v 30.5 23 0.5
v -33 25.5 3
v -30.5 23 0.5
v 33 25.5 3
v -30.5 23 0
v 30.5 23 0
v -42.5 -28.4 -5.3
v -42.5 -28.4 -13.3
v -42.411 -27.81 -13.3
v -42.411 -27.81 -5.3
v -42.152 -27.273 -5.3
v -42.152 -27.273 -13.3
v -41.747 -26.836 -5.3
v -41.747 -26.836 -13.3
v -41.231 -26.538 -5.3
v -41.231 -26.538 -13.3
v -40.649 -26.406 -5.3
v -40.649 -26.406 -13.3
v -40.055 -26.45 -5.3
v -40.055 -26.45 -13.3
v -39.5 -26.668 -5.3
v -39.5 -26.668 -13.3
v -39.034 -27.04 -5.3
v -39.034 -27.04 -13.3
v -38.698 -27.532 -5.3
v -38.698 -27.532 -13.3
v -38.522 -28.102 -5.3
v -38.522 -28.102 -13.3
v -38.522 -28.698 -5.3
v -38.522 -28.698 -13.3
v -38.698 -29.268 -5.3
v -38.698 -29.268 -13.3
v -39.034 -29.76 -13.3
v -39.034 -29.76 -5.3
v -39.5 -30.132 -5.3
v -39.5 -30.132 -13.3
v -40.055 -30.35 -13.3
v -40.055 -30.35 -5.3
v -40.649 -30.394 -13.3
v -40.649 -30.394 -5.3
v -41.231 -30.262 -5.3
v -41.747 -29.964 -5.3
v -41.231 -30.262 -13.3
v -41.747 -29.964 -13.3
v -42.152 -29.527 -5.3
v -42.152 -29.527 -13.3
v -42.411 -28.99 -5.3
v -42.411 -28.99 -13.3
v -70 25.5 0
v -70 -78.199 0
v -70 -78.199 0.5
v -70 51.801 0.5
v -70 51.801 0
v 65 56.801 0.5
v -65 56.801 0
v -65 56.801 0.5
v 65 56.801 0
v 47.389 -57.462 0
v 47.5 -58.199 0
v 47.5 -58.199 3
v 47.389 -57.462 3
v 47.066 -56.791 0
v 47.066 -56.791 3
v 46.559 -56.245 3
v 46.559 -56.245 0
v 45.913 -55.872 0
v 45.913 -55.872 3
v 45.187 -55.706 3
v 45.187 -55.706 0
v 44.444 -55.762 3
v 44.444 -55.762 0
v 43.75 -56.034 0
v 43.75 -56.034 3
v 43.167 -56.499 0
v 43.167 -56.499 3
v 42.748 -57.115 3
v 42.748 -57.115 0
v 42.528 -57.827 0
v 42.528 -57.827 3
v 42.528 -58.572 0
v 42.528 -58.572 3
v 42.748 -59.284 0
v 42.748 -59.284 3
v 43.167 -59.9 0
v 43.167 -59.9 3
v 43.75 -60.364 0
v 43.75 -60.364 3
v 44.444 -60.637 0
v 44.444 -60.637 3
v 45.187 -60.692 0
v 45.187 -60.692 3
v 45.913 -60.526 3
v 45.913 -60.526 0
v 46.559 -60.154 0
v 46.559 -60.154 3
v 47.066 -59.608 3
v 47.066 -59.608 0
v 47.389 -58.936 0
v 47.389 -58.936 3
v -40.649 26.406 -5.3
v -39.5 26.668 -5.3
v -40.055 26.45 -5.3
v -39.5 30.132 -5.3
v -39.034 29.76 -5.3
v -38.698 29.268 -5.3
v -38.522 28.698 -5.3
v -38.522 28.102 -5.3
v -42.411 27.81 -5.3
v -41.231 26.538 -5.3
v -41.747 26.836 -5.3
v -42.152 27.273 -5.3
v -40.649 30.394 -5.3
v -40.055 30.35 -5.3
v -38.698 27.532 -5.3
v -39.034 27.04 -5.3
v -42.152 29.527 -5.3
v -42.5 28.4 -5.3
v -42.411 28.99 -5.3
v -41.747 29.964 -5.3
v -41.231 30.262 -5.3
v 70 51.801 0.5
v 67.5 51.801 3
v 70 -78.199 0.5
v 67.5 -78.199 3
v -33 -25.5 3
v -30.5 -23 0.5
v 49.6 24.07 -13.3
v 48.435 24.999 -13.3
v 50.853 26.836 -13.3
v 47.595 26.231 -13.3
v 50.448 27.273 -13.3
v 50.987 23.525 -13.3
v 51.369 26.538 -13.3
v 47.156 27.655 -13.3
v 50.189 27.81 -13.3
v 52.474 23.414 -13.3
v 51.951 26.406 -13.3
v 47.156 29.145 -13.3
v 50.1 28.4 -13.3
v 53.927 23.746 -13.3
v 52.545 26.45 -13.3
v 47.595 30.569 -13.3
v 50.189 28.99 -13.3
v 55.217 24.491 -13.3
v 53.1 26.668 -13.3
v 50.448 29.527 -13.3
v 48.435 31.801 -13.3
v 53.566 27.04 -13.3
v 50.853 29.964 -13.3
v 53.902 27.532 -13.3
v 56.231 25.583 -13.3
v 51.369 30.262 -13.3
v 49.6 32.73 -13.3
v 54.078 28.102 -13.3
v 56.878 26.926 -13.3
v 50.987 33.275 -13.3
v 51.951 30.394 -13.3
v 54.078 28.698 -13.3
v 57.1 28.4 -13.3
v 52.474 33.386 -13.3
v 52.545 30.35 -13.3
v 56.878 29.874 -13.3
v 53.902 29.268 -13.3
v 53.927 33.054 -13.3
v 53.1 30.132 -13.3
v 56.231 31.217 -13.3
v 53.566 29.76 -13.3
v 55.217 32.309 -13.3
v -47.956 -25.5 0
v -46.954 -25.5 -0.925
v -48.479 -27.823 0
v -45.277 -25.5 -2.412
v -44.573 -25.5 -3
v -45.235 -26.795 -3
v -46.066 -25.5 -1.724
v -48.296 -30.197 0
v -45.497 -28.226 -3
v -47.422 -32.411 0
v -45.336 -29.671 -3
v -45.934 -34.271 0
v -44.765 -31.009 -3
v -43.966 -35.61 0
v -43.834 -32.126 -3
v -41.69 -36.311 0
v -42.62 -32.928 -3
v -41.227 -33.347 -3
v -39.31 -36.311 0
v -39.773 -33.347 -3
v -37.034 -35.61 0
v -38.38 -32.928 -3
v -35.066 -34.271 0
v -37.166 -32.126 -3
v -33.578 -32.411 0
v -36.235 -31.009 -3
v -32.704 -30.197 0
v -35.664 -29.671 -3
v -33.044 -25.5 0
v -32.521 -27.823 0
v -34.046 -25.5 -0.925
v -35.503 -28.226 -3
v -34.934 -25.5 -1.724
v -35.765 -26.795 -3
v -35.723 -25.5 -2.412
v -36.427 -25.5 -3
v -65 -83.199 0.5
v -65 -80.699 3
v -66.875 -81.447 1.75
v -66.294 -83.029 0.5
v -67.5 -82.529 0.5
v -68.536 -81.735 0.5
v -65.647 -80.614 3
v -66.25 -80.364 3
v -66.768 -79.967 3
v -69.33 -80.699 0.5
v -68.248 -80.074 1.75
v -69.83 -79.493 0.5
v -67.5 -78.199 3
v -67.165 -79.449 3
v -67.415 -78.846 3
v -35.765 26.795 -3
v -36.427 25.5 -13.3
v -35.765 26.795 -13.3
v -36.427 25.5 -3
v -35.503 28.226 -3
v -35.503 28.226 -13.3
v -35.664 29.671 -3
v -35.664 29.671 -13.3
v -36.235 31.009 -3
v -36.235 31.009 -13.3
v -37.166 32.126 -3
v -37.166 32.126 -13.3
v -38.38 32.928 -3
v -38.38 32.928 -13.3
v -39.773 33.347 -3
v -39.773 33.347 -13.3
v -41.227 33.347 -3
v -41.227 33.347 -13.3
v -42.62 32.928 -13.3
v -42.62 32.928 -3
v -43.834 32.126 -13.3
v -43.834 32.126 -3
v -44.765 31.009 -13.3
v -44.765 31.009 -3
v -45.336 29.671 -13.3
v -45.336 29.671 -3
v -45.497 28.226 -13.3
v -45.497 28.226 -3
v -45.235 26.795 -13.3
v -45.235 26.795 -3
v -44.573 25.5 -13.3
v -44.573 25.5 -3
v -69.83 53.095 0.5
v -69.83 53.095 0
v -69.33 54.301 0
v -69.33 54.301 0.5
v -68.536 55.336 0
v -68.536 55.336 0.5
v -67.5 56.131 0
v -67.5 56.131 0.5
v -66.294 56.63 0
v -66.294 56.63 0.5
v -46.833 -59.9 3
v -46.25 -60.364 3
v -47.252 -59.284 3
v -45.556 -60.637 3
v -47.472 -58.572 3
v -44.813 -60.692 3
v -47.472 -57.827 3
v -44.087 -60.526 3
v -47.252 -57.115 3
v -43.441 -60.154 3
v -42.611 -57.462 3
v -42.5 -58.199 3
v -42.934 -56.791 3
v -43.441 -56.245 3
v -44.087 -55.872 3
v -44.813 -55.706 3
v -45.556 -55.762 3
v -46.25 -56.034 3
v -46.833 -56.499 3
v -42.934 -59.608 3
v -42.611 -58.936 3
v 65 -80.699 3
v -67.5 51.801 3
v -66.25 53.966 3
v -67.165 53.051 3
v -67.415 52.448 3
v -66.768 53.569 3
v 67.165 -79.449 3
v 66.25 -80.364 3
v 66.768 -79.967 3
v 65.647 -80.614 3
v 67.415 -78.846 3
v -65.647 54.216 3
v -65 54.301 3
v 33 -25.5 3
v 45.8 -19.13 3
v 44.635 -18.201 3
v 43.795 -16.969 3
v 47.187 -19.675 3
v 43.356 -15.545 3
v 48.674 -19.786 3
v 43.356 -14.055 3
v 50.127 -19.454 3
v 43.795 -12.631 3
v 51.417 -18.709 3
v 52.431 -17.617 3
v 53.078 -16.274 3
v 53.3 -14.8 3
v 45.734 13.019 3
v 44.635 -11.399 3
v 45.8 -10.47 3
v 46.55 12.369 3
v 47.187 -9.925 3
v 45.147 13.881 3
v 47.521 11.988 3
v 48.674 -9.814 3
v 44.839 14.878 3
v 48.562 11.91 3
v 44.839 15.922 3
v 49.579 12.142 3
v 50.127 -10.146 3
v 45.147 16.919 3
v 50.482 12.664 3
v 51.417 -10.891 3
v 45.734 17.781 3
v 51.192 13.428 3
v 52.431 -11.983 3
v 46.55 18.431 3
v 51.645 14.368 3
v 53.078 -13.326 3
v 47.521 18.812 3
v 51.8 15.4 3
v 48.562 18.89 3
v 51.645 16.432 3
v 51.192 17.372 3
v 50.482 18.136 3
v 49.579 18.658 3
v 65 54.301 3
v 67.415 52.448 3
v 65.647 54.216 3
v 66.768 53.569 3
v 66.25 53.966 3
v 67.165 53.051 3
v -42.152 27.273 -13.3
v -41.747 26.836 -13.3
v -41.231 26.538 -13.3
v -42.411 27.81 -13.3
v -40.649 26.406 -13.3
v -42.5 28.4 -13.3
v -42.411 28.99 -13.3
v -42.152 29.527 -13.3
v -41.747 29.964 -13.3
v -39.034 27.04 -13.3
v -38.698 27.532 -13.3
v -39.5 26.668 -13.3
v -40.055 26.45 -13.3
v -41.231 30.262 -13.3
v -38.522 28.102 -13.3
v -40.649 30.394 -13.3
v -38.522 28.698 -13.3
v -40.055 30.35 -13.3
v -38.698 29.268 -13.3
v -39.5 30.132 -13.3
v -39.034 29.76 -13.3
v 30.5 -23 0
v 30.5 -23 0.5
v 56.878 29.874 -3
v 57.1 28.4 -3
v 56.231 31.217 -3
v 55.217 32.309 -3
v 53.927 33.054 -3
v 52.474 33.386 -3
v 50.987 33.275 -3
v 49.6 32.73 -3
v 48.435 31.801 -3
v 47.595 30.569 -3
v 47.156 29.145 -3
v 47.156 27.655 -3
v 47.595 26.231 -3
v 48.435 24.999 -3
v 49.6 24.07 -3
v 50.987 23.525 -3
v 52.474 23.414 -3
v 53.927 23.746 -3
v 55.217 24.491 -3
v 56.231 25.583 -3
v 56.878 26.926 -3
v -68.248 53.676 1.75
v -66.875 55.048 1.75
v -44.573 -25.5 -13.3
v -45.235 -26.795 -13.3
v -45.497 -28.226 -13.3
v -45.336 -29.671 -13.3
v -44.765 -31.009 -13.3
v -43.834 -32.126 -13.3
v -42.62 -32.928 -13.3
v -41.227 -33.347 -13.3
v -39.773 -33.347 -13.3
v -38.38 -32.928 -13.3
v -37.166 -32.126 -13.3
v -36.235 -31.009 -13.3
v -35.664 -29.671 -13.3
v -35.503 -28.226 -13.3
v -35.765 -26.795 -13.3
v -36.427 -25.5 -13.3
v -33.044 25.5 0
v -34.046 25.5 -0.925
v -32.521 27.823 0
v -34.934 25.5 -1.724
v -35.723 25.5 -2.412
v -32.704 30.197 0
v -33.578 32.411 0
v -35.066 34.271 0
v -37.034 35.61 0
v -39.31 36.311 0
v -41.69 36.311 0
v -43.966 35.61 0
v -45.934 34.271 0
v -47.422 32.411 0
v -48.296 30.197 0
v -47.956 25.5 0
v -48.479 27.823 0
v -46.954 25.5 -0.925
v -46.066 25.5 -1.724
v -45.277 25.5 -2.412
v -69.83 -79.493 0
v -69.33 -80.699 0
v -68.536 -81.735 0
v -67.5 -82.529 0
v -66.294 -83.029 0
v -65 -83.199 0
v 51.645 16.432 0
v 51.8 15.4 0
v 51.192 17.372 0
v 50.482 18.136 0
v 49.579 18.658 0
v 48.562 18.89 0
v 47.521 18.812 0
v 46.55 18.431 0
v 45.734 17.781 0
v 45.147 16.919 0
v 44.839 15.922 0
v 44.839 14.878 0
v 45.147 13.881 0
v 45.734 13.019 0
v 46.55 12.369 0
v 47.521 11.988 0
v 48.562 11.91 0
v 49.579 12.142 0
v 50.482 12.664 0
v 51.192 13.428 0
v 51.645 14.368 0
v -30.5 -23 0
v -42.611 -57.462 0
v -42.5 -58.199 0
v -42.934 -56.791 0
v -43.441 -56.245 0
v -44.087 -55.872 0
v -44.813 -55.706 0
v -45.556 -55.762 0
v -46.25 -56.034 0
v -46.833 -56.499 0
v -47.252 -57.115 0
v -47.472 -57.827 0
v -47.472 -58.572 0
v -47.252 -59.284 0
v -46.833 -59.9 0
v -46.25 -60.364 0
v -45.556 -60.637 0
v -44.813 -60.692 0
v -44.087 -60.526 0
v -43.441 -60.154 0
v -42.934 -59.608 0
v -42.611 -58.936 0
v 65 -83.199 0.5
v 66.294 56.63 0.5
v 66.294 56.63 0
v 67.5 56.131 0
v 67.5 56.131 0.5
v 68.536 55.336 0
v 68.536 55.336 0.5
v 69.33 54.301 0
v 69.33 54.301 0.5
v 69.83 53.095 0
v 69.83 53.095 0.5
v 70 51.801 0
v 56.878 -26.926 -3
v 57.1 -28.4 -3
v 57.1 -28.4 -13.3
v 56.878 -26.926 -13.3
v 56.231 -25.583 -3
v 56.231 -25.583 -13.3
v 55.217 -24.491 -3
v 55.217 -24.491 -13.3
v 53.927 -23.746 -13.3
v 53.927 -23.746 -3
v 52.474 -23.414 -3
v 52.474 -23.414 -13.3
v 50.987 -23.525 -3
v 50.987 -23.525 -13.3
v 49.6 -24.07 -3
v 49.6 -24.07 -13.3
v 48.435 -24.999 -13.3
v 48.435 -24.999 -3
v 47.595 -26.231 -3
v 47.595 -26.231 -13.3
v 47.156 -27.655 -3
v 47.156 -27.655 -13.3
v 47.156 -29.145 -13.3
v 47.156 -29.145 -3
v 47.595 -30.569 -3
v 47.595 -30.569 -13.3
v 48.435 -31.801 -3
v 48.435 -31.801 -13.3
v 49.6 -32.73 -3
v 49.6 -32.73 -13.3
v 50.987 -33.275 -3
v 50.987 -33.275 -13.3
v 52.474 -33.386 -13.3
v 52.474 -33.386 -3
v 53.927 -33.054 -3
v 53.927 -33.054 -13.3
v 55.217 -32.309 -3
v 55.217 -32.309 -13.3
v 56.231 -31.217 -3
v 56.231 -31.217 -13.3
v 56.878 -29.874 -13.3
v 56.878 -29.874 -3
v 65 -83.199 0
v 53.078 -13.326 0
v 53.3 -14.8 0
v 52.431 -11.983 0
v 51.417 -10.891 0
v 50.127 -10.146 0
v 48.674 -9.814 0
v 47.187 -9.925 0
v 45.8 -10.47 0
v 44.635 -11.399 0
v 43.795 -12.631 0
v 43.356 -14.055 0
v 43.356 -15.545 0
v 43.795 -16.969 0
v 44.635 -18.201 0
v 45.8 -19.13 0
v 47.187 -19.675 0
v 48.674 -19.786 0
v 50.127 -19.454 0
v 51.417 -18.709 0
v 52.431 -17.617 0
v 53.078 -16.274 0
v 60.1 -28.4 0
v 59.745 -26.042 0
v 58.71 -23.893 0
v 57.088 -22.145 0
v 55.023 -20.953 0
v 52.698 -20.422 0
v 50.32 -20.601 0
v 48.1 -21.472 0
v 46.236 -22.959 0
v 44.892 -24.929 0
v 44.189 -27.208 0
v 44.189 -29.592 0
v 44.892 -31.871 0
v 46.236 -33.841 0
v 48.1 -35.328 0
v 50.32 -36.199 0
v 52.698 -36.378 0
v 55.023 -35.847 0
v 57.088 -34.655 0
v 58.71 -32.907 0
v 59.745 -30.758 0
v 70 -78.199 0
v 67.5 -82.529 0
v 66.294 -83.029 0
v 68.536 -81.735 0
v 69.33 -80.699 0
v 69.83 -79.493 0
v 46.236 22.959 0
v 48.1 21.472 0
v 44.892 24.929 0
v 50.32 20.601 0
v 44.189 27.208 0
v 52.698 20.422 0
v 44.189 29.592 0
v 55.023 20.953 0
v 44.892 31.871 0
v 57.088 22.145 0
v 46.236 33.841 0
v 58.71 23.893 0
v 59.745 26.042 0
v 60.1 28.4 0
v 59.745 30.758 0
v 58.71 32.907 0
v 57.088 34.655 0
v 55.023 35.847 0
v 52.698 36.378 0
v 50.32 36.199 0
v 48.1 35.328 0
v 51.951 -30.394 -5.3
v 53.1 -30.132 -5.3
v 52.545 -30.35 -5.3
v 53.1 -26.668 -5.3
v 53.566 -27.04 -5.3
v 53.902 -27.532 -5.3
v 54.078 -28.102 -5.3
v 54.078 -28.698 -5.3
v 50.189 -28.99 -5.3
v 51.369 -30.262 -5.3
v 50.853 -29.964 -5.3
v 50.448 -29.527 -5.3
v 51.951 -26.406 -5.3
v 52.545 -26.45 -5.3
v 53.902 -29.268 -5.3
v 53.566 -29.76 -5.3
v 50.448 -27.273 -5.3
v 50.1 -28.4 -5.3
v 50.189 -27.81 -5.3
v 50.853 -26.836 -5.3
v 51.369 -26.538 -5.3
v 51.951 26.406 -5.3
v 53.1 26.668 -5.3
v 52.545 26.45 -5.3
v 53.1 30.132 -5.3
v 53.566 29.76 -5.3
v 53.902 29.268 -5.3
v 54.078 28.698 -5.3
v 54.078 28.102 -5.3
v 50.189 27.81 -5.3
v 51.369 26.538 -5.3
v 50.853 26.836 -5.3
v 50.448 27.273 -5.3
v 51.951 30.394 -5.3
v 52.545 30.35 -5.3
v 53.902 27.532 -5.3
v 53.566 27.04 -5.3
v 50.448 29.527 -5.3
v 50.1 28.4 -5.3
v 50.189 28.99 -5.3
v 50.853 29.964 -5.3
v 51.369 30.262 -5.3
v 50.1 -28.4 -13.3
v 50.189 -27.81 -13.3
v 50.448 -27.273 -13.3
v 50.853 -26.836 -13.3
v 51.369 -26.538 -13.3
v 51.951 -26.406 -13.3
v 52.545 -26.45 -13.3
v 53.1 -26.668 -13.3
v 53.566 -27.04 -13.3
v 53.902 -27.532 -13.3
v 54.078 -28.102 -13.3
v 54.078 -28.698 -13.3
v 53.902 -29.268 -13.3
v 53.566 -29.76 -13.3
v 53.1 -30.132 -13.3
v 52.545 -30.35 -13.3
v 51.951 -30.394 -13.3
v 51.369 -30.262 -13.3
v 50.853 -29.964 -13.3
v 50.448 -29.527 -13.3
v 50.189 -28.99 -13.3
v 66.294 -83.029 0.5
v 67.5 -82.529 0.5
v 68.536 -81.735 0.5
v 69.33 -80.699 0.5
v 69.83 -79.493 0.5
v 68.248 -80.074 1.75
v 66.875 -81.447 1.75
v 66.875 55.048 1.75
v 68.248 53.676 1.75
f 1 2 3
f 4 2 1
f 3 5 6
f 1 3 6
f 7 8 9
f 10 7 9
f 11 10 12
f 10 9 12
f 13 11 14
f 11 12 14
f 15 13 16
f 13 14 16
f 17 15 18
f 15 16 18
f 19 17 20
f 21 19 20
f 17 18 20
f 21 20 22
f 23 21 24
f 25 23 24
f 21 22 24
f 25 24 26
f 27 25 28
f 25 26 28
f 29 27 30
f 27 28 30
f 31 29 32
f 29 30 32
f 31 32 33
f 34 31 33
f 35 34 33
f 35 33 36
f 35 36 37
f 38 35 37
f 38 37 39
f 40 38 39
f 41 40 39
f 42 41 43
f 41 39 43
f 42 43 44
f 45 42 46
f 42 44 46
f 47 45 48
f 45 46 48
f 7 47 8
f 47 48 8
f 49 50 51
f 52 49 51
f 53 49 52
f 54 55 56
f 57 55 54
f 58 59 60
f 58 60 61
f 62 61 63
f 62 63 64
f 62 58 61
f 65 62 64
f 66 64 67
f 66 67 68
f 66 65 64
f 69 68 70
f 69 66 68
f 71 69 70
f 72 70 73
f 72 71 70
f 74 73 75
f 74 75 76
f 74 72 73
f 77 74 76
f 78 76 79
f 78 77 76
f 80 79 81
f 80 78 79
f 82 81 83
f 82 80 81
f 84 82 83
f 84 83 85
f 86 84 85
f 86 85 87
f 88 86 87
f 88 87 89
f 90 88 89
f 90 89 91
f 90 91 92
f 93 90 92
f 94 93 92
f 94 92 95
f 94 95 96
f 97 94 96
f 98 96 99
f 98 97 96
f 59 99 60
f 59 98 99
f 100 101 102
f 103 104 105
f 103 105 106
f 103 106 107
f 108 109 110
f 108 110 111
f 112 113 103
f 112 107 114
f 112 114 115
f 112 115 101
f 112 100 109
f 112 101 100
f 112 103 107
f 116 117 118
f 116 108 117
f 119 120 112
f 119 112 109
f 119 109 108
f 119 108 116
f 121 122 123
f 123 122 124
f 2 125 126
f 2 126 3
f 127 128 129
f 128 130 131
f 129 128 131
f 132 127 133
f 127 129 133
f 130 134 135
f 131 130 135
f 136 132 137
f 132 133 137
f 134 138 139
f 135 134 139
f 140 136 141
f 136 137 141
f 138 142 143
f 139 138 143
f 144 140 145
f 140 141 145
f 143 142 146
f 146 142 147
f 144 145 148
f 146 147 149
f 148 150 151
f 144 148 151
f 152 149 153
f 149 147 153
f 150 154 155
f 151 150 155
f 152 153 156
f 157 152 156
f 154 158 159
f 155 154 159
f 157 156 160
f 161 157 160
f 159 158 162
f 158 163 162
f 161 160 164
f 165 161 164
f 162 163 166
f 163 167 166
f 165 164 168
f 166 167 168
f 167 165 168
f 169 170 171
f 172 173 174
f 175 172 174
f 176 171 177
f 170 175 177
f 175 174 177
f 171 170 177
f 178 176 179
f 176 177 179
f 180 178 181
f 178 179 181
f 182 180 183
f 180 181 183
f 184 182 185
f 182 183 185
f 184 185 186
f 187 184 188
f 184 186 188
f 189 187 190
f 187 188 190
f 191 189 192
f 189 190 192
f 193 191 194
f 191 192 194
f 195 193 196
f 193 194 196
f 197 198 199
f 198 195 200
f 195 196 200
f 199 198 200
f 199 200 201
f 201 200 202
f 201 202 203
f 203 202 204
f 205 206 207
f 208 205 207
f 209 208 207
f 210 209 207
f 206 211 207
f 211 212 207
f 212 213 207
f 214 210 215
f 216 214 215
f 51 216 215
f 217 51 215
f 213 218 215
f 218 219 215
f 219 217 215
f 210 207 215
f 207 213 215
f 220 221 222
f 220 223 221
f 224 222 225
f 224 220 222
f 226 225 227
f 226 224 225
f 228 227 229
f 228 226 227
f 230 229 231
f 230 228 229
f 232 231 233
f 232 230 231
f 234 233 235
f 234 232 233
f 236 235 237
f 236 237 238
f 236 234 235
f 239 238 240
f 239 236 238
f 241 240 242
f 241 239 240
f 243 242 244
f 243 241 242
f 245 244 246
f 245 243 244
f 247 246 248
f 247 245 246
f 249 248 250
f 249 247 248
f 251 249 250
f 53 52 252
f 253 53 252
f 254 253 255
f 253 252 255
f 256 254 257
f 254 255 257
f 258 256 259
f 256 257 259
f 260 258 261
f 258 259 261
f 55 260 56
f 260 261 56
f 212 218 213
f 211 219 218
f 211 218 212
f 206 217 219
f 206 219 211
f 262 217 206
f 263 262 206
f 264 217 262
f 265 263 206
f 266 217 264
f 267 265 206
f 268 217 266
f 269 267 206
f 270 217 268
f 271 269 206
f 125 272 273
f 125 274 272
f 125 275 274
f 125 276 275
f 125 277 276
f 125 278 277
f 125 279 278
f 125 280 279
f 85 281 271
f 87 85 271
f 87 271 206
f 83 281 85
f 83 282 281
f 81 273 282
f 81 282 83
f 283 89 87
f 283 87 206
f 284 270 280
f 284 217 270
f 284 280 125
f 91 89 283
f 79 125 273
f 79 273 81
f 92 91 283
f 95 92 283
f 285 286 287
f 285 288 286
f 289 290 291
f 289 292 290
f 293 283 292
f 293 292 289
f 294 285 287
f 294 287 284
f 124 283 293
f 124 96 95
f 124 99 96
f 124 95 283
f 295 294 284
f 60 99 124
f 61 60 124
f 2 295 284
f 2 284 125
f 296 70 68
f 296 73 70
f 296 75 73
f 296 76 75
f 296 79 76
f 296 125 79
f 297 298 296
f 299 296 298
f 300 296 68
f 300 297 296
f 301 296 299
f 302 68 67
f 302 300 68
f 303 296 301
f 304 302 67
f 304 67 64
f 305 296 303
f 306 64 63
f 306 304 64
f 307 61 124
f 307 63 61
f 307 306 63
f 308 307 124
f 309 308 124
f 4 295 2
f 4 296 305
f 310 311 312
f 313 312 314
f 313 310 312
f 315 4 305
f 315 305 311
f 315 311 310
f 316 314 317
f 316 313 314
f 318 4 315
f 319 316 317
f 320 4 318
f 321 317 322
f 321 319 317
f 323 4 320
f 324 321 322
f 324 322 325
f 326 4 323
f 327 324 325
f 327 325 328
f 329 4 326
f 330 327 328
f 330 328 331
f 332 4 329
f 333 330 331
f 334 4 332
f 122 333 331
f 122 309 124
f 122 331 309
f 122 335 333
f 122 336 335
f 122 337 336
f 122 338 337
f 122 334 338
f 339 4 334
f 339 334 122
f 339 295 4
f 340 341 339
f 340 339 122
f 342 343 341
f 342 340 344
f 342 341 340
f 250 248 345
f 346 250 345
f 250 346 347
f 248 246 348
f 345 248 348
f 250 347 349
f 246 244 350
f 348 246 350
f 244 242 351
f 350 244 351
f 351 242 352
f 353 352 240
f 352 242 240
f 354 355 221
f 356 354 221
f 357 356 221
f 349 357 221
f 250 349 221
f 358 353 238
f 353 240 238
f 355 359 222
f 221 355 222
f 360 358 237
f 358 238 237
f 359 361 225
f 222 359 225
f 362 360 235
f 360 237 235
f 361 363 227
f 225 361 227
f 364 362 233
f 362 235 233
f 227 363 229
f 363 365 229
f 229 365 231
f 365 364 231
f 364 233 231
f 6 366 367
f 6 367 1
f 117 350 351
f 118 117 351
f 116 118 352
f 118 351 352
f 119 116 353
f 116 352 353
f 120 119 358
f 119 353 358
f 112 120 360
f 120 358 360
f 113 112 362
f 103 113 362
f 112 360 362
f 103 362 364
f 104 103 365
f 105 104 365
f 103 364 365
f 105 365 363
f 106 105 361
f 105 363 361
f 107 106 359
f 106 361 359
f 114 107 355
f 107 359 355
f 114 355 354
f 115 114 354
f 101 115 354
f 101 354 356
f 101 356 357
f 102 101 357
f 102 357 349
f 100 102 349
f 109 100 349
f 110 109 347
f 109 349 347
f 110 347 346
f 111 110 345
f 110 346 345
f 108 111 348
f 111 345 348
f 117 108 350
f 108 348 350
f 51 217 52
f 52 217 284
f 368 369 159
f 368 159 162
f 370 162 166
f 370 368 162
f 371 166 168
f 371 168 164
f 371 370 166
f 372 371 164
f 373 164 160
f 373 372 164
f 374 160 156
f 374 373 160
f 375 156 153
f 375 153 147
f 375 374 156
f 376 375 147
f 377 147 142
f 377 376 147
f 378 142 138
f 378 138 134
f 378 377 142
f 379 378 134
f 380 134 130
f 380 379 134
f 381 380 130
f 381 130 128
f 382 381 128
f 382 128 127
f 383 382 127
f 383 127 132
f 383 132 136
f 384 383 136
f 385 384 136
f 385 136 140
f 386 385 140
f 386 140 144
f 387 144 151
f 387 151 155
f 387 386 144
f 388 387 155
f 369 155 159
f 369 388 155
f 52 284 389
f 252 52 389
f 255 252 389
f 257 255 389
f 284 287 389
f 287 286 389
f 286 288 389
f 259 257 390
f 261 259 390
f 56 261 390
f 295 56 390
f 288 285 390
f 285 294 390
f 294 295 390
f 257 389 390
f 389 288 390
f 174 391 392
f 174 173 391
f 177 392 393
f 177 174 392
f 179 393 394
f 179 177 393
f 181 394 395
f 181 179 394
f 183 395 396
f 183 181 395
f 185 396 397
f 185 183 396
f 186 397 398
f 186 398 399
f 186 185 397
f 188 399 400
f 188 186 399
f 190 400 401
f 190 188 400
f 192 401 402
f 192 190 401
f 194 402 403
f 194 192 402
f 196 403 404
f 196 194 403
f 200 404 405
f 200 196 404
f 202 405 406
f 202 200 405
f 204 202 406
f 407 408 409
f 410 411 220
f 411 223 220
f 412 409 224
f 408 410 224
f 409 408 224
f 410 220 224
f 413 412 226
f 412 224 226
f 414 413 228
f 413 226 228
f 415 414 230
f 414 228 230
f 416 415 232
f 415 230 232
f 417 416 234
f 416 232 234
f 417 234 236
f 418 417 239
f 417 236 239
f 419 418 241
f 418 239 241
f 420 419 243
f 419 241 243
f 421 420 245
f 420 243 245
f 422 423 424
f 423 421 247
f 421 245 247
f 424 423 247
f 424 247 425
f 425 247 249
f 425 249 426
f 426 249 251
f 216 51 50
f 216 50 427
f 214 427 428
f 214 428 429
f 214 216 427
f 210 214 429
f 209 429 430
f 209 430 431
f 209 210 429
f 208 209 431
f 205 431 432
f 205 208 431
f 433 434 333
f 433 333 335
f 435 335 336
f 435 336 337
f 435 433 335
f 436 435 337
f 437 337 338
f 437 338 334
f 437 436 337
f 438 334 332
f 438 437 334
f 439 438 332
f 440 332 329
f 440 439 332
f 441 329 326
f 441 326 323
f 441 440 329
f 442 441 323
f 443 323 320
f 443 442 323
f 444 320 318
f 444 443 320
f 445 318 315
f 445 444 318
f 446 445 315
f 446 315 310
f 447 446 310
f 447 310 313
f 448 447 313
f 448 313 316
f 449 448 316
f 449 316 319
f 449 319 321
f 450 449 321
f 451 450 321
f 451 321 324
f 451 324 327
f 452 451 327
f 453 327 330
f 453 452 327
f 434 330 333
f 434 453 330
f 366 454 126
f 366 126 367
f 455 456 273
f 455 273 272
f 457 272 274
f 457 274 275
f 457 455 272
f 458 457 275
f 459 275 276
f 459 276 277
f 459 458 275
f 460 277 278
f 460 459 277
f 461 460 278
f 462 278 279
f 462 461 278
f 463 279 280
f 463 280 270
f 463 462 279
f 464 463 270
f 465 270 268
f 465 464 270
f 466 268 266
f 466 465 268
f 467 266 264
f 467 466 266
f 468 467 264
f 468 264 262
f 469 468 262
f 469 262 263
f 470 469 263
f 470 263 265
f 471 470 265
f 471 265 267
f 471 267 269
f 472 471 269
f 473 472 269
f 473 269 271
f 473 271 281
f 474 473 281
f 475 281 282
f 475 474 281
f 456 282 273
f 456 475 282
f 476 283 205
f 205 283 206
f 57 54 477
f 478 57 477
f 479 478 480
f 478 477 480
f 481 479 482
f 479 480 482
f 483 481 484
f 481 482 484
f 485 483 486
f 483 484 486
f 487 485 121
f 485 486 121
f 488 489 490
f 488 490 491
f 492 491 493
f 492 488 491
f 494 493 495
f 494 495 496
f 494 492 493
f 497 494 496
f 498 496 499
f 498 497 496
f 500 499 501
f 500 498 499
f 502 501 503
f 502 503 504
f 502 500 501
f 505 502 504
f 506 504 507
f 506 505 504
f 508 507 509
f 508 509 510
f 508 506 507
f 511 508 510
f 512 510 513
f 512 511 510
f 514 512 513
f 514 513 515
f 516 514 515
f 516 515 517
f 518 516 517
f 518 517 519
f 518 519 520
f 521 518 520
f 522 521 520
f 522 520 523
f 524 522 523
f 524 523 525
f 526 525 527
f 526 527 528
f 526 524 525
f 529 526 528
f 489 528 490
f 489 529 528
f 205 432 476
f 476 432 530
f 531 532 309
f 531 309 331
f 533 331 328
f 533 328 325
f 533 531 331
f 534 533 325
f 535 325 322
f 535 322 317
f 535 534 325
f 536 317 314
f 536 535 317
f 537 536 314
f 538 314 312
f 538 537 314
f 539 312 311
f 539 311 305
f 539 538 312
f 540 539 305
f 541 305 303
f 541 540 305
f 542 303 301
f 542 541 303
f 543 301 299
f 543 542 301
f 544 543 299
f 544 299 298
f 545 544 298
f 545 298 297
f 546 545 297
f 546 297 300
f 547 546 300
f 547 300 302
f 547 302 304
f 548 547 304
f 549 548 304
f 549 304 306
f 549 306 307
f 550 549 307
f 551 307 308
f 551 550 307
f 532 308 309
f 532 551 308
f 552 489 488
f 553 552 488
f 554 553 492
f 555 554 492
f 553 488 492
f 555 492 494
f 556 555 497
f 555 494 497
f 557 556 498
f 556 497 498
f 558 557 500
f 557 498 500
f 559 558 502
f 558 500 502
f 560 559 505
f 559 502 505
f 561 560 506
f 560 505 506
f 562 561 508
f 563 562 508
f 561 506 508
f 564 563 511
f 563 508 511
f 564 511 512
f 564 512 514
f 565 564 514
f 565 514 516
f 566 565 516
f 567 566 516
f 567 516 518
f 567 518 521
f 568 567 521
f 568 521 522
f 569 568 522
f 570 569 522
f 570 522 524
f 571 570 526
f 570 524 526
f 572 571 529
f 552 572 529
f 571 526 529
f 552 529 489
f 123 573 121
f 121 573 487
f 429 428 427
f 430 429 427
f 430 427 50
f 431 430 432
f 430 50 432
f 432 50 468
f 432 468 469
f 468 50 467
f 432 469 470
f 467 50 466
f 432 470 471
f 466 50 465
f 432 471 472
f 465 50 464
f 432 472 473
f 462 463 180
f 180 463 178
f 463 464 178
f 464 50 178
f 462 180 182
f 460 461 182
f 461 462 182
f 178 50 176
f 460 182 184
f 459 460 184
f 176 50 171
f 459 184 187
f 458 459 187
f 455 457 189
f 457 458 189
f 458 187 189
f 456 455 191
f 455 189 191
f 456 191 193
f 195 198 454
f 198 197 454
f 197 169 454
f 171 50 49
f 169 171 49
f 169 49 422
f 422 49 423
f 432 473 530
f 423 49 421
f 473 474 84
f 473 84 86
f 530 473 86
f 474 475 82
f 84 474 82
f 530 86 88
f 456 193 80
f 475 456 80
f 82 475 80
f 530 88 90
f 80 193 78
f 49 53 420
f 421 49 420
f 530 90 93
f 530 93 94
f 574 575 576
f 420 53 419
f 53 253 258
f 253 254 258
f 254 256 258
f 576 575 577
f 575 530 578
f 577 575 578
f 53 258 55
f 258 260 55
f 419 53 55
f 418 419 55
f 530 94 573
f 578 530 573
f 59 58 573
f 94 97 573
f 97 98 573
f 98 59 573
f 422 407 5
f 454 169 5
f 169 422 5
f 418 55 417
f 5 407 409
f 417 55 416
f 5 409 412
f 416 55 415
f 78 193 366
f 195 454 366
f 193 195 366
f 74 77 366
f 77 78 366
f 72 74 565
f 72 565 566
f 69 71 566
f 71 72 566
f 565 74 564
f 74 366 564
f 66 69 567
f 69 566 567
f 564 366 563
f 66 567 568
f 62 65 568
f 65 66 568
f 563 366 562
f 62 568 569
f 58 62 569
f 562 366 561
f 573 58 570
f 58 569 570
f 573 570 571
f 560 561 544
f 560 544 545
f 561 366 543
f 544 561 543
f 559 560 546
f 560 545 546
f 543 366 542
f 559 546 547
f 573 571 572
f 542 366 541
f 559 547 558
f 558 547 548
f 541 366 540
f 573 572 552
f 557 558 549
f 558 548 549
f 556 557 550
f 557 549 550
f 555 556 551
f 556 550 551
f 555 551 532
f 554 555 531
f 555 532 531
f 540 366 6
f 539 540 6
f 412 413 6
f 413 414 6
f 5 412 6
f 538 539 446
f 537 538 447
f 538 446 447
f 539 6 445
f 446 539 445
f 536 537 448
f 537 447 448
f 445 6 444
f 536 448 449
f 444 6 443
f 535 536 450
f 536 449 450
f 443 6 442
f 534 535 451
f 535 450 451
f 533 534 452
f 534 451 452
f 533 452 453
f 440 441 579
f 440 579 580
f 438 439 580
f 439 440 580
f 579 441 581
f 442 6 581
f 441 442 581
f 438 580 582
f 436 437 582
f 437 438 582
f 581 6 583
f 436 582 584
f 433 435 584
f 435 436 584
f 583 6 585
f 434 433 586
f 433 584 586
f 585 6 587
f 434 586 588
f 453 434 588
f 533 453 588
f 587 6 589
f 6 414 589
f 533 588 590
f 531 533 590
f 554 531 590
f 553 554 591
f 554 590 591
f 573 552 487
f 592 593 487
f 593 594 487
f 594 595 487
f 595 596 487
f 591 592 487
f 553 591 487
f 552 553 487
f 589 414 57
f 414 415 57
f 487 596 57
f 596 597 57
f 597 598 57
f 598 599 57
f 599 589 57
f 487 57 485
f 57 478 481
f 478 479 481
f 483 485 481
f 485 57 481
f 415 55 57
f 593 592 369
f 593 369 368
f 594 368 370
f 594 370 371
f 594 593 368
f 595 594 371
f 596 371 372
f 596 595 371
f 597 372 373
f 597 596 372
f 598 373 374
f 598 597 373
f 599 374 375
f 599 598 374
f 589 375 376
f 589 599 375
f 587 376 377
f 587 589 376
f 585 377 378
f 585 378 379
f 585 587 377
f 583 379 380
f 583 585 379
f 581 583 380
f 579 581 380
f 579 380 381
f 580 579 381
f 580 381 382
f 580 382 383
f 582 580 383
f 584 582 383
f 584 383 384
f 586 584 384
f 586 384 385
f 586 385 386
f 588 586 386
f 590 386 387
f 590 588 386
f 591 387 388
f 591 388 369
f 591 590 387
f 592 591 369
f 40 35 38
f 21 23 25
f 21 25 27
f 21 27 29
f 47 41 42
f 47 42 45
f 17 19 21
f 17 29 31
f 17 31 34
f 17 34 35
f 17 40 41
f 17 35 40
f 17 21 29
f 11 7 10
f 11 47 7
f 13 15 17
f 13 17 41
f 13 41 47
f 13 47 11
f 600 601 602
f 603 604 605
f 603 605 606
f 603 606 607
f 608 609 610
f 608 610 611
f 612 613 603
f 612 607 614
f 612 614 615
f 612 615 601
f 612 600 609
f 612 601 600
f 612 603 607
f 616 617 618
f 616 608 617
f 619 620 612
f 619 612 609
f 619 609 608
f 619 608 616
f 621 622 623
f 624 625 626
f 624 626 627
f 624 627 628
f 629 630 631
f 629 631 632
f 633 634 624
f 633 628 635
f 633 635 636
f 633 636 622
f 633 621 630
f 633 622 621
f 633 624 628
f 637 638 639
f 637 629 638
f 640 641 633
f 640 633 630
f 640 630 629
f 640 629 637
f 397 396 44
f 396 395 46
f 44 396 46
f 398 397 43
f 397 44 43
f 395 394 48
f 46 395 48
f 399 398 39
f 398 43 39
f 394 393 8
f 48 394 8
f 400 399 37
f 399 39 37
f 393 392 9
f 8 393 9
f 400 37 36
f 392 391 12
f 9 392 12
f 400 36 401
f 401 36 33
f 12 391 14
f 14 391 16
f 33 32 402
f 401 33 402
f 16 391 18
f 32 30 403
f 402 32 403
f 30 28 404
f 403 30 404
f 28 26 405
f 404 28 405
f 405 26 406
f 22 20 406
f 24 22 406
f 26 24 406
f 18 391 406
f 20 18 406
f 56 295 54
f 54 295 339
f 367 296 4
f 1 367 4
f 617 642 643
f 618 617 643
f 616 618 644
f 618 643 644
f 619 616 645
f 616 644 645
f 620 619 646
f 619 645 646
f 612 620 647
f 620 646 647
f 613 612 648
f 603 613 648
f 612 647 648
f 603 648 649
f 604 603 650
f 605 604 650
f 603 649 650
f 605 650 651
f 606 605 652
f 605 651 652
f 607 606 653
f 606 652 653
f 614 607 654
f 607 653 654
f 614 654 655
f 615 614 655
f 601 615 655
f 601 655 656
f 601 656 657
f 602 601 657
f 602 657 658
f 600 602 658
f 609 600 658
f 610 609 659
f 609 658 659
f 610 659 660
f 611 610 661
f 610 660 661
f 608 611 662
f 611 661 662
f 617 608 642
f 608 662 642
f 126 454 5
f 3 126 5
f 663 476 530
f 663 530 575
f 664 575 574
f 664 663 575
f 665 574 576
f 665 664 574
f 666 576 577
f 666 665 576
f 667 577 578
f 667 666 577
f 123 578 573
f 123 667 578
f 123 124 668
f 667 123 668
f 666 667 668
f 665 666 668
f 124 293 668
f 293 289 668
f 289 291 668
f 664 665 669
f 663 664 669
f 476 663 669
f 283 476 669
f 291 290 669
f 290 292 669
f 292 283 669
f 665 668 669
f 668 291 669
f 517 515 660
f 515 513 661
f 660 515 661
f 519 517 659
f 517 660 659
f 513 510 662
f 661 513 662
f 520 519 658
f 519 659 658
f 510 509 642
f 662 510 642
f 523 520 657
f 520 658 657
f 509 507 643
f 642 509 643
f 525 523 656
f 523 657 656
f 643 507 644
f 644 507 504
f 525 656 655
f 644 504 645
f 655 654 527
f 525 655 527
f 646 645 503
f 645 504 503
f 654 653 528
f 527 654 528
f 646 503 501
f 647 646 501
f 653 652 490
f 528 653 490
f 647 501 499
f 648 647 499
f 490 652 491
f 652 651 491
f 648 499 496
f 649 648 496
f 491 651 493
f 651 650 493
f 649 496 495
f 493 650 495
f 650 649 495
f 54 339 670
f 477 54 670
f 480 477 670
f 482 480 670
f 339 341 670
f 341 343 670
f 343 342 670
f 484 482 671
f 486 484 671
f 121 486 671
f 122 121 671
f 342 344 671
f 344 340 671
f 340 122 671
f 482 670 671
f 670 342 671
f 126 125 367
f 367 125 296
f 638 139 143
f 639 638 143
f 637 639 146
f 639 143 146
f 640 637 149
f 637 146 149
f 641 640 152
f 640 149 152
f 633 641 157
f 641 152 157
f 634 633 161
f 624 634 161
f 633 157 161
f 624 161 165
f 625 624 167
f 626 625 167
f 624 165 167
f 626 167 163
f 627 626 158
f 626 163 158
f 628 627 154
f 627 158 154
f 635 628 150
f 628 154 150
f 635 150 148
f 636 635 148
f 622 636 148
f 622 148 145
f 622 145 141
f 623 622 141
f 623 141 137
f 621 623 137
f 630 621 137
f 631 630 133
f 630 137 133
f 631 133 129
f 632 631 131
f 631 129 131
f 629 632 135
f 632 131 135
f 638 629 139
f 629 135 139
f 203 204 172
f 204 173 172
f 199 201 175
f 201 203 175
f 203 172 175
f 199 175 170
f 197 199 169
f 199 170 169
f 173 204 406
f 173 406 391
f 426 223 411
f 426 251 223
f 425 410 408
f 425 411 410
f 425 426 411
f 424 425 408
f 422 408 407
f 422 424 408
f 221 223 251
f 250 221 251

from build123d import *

# Parameters (mm, degrees)
SKETCH1_W           = 140
SKETCH1_H           = 140
SKETCH1_R           = 3.5
SKETCH1_R_2         = 2
SKETCH1_R_3         = 5
SKETCH1_R_4         = 2.5
SKETCH1_W_2         = 61
SKETCH1_H_2         = 46
BOSS_EXTRUDE1_DEPTH = 3
CHAMFER1_SIZE       = 2.5
FILLET1_R           = 5
CHAMFER2_SIZE       = 2.5
SKETCH2_R           = 5
BOSS_EXTRUDE3_DEPTH = 13.3
CHAMFER3_SIZE       = 3
SKETCH4_R           = 2
CUT_EXTRUDE1_DEPTH  = 8
SKETCH6_W           = 89.583277887
SKETCH6_H           = 51
CUT_EXTRUDE2_DEPTH  = 13.3
SKETCH7_R           = 4.27453946
SKETCH7_R_2         = 4.288417291
SKETCH7_R_3         = 5.40642801
SKETCH7_R_4         = 4.2459997
BOSS_EXTRUDE4_DEPTH = 3


with BuildPart() as part:
    # Sketch1 → Boss-Extrude1 (new body)
    with BuildSketch(Plane.XY):
        with Locations((0, -13.199218639)):
            Rectangle(SKETCH1_W, SKETCH1_H)
        with Locations((48.3, 15.4)):
            Circle(SKETCH1_R, mode=Mode.SUBTRACT)
        with Locations((-40.5, 28.4)):
            Circle(SKETCH1_R_2, mode=Mode.SUBTRACT)
        with Locations((52.1, 28.4)):
            Circle(SKETCH1_R_2, mode=Mode.SUBTRACT)
        with Locations((52.1, -28.4)):
            Circle(SKETCH1_R_2, mode=Mode.SUBTRACT)
        with Locations((-40.5, -28.4)):
            Circle(SKETCH1_R_2, mode=Mode.SUBTRACT)
        with Locations((48.3, -14.8)):
            Circle(SKETCH1_R_3, mode=Mode.SUBTRACT)
        with Locations((45, -58.199218639)):
            Circle(SKETCH1_R_4, mode=Mode.SUBTRACT)
        with Locations((-45, -58.199218639)):
            Circle(SKETCH1_R_4, mode=Mode.SUBTRACT)
        Rectangle(SKETCH1_W_2, SKETCH1_H_2, mode=Mode.SUBTRACT)
    extrude(amount=BOSS_EXTRUDE1_DEPTH)

    # Chamfer1
    chamfer1_edges = [part.edges().sort_by_distance(p)[0] for p in [
        (30.5, 0, 3),
        (0, 23, 3),
        (-30.5, 0, 3),
        (0, -23, 3),
    ]]
    chamfer(chamfer1_edges, length=CHAMFER1_SIZE)

    # Fillet1
    fillet1_edges = [part.edges().sort_by_distance(p)[0] for p in [
        (70, -83.199218639, 1.5),
        (-70, -83.199218639, 1.5),
        (-70, 56.800781361, 1.5),
        (70, 56.800781361, 1.5),
    ]]
    fillet(fillet1_edges, radius=FILLET1_R)

    # Chamfer2
    chamfer2_edges = [part.edges().sort_by_distance(p)[0] for p in [
        (-70, -13.199218639, 3),
        (0, 56.800781361, 3),
        (70, -13.199218639, 3),
        (0, -83.199218639, 3),
        (-68.535533906, -81.734752545, 3),
        (68.535533906, -81.734752545, 3),
        (68.535533906, 55.336315267, 3),
        (-68.535533906, 55.336315267, 3),
    ]]
    chamfer(chamfer2_edges, length=CHAMFER2_SIZE)

    # Sketch2 → Boss-Extrude3 (add)
    with BuildSketch(Plane.XY):
        with Locations((52.1, 28.4)):
            Circle(SKETCH2_R)
        with Locations((52.1, -28.4)):
            Circle(SKETCH2_R)
        with Locations((-40.5, 28.4)):
            Circle(SKETCH2_R)
        with Locations((-40.5, -28.4)):
            Circle(SKETCH2_R)
    extrude(amount=-BOSS_EXTRUDE3_DEPTH)

    # Chamfer3
    chamfer3_edges = [part.edges().sort_by_distance(p)[0] for p in [
        (47.1, 28.4, 0),
        (47.1, -28.4, 0),
        (-45.5, 28.4, 0),
        (-45.5, -28.4, 0),
    ]]
    chamfer(chamfer3_edges, length=CHAMFER3_SIZE)

    # Sketch4 → Cut-Extrude1 (cut)
    with BuildSketch(Plane(origin=(0, 0, -13.3), x_dir=(-1, 0, 0), z_dir=(0, 0, -1))):
        with Locations((-52.1, 28.4)):
            Circle(SKETCH4_R)
        with Locations((40.5, 28.4)):
            Circle(SKETCH4_R)
        with Locations((40.5, -28.4)):
            Circle(SKETCH4_R)
        with Locations((-52.1, -28.4)):
            Circle(SKETCH4_R)
    extrude(amount=-CUT_EXTRUDE1_DEPTH, mode=Mode.SUBTRACT)

    # Sketch6 → Cut-Extrude2 (cut)
    with BuildSketch(Plane(origin=(0, 0, -13.3), x_dir=(-1, 0, 0), z_dir=(0, 0, -1))):
        with Locations((25.208361056, 0)):
            Rectangle(SKETCH6_W, SKETCH6_H)
    extrude(amount=-CUT_EXTRUDE2_DEPTH, mode=Mode.SUBTRACT)

    # Sketch7 → Boss-Extrude4 (add)
    with BuildSketch(Plane.XY.offset(3)):
        with Locations((-40.5, 28.4)):
            Circle(SKETCH7_R)
        with Locations((-40.5, -28.4)):
            Circle(SKETCH7_R_2)
        with Locations((52.1, 28.4)):
            Circle(SKETCH7_R_3)
        with Locations((52.1, -28.4)):
            Circle(SKETCH7_R_4)
    extrude(amount=-BOSS_EXTRUDE4_DEPTH)


solid = part.part
